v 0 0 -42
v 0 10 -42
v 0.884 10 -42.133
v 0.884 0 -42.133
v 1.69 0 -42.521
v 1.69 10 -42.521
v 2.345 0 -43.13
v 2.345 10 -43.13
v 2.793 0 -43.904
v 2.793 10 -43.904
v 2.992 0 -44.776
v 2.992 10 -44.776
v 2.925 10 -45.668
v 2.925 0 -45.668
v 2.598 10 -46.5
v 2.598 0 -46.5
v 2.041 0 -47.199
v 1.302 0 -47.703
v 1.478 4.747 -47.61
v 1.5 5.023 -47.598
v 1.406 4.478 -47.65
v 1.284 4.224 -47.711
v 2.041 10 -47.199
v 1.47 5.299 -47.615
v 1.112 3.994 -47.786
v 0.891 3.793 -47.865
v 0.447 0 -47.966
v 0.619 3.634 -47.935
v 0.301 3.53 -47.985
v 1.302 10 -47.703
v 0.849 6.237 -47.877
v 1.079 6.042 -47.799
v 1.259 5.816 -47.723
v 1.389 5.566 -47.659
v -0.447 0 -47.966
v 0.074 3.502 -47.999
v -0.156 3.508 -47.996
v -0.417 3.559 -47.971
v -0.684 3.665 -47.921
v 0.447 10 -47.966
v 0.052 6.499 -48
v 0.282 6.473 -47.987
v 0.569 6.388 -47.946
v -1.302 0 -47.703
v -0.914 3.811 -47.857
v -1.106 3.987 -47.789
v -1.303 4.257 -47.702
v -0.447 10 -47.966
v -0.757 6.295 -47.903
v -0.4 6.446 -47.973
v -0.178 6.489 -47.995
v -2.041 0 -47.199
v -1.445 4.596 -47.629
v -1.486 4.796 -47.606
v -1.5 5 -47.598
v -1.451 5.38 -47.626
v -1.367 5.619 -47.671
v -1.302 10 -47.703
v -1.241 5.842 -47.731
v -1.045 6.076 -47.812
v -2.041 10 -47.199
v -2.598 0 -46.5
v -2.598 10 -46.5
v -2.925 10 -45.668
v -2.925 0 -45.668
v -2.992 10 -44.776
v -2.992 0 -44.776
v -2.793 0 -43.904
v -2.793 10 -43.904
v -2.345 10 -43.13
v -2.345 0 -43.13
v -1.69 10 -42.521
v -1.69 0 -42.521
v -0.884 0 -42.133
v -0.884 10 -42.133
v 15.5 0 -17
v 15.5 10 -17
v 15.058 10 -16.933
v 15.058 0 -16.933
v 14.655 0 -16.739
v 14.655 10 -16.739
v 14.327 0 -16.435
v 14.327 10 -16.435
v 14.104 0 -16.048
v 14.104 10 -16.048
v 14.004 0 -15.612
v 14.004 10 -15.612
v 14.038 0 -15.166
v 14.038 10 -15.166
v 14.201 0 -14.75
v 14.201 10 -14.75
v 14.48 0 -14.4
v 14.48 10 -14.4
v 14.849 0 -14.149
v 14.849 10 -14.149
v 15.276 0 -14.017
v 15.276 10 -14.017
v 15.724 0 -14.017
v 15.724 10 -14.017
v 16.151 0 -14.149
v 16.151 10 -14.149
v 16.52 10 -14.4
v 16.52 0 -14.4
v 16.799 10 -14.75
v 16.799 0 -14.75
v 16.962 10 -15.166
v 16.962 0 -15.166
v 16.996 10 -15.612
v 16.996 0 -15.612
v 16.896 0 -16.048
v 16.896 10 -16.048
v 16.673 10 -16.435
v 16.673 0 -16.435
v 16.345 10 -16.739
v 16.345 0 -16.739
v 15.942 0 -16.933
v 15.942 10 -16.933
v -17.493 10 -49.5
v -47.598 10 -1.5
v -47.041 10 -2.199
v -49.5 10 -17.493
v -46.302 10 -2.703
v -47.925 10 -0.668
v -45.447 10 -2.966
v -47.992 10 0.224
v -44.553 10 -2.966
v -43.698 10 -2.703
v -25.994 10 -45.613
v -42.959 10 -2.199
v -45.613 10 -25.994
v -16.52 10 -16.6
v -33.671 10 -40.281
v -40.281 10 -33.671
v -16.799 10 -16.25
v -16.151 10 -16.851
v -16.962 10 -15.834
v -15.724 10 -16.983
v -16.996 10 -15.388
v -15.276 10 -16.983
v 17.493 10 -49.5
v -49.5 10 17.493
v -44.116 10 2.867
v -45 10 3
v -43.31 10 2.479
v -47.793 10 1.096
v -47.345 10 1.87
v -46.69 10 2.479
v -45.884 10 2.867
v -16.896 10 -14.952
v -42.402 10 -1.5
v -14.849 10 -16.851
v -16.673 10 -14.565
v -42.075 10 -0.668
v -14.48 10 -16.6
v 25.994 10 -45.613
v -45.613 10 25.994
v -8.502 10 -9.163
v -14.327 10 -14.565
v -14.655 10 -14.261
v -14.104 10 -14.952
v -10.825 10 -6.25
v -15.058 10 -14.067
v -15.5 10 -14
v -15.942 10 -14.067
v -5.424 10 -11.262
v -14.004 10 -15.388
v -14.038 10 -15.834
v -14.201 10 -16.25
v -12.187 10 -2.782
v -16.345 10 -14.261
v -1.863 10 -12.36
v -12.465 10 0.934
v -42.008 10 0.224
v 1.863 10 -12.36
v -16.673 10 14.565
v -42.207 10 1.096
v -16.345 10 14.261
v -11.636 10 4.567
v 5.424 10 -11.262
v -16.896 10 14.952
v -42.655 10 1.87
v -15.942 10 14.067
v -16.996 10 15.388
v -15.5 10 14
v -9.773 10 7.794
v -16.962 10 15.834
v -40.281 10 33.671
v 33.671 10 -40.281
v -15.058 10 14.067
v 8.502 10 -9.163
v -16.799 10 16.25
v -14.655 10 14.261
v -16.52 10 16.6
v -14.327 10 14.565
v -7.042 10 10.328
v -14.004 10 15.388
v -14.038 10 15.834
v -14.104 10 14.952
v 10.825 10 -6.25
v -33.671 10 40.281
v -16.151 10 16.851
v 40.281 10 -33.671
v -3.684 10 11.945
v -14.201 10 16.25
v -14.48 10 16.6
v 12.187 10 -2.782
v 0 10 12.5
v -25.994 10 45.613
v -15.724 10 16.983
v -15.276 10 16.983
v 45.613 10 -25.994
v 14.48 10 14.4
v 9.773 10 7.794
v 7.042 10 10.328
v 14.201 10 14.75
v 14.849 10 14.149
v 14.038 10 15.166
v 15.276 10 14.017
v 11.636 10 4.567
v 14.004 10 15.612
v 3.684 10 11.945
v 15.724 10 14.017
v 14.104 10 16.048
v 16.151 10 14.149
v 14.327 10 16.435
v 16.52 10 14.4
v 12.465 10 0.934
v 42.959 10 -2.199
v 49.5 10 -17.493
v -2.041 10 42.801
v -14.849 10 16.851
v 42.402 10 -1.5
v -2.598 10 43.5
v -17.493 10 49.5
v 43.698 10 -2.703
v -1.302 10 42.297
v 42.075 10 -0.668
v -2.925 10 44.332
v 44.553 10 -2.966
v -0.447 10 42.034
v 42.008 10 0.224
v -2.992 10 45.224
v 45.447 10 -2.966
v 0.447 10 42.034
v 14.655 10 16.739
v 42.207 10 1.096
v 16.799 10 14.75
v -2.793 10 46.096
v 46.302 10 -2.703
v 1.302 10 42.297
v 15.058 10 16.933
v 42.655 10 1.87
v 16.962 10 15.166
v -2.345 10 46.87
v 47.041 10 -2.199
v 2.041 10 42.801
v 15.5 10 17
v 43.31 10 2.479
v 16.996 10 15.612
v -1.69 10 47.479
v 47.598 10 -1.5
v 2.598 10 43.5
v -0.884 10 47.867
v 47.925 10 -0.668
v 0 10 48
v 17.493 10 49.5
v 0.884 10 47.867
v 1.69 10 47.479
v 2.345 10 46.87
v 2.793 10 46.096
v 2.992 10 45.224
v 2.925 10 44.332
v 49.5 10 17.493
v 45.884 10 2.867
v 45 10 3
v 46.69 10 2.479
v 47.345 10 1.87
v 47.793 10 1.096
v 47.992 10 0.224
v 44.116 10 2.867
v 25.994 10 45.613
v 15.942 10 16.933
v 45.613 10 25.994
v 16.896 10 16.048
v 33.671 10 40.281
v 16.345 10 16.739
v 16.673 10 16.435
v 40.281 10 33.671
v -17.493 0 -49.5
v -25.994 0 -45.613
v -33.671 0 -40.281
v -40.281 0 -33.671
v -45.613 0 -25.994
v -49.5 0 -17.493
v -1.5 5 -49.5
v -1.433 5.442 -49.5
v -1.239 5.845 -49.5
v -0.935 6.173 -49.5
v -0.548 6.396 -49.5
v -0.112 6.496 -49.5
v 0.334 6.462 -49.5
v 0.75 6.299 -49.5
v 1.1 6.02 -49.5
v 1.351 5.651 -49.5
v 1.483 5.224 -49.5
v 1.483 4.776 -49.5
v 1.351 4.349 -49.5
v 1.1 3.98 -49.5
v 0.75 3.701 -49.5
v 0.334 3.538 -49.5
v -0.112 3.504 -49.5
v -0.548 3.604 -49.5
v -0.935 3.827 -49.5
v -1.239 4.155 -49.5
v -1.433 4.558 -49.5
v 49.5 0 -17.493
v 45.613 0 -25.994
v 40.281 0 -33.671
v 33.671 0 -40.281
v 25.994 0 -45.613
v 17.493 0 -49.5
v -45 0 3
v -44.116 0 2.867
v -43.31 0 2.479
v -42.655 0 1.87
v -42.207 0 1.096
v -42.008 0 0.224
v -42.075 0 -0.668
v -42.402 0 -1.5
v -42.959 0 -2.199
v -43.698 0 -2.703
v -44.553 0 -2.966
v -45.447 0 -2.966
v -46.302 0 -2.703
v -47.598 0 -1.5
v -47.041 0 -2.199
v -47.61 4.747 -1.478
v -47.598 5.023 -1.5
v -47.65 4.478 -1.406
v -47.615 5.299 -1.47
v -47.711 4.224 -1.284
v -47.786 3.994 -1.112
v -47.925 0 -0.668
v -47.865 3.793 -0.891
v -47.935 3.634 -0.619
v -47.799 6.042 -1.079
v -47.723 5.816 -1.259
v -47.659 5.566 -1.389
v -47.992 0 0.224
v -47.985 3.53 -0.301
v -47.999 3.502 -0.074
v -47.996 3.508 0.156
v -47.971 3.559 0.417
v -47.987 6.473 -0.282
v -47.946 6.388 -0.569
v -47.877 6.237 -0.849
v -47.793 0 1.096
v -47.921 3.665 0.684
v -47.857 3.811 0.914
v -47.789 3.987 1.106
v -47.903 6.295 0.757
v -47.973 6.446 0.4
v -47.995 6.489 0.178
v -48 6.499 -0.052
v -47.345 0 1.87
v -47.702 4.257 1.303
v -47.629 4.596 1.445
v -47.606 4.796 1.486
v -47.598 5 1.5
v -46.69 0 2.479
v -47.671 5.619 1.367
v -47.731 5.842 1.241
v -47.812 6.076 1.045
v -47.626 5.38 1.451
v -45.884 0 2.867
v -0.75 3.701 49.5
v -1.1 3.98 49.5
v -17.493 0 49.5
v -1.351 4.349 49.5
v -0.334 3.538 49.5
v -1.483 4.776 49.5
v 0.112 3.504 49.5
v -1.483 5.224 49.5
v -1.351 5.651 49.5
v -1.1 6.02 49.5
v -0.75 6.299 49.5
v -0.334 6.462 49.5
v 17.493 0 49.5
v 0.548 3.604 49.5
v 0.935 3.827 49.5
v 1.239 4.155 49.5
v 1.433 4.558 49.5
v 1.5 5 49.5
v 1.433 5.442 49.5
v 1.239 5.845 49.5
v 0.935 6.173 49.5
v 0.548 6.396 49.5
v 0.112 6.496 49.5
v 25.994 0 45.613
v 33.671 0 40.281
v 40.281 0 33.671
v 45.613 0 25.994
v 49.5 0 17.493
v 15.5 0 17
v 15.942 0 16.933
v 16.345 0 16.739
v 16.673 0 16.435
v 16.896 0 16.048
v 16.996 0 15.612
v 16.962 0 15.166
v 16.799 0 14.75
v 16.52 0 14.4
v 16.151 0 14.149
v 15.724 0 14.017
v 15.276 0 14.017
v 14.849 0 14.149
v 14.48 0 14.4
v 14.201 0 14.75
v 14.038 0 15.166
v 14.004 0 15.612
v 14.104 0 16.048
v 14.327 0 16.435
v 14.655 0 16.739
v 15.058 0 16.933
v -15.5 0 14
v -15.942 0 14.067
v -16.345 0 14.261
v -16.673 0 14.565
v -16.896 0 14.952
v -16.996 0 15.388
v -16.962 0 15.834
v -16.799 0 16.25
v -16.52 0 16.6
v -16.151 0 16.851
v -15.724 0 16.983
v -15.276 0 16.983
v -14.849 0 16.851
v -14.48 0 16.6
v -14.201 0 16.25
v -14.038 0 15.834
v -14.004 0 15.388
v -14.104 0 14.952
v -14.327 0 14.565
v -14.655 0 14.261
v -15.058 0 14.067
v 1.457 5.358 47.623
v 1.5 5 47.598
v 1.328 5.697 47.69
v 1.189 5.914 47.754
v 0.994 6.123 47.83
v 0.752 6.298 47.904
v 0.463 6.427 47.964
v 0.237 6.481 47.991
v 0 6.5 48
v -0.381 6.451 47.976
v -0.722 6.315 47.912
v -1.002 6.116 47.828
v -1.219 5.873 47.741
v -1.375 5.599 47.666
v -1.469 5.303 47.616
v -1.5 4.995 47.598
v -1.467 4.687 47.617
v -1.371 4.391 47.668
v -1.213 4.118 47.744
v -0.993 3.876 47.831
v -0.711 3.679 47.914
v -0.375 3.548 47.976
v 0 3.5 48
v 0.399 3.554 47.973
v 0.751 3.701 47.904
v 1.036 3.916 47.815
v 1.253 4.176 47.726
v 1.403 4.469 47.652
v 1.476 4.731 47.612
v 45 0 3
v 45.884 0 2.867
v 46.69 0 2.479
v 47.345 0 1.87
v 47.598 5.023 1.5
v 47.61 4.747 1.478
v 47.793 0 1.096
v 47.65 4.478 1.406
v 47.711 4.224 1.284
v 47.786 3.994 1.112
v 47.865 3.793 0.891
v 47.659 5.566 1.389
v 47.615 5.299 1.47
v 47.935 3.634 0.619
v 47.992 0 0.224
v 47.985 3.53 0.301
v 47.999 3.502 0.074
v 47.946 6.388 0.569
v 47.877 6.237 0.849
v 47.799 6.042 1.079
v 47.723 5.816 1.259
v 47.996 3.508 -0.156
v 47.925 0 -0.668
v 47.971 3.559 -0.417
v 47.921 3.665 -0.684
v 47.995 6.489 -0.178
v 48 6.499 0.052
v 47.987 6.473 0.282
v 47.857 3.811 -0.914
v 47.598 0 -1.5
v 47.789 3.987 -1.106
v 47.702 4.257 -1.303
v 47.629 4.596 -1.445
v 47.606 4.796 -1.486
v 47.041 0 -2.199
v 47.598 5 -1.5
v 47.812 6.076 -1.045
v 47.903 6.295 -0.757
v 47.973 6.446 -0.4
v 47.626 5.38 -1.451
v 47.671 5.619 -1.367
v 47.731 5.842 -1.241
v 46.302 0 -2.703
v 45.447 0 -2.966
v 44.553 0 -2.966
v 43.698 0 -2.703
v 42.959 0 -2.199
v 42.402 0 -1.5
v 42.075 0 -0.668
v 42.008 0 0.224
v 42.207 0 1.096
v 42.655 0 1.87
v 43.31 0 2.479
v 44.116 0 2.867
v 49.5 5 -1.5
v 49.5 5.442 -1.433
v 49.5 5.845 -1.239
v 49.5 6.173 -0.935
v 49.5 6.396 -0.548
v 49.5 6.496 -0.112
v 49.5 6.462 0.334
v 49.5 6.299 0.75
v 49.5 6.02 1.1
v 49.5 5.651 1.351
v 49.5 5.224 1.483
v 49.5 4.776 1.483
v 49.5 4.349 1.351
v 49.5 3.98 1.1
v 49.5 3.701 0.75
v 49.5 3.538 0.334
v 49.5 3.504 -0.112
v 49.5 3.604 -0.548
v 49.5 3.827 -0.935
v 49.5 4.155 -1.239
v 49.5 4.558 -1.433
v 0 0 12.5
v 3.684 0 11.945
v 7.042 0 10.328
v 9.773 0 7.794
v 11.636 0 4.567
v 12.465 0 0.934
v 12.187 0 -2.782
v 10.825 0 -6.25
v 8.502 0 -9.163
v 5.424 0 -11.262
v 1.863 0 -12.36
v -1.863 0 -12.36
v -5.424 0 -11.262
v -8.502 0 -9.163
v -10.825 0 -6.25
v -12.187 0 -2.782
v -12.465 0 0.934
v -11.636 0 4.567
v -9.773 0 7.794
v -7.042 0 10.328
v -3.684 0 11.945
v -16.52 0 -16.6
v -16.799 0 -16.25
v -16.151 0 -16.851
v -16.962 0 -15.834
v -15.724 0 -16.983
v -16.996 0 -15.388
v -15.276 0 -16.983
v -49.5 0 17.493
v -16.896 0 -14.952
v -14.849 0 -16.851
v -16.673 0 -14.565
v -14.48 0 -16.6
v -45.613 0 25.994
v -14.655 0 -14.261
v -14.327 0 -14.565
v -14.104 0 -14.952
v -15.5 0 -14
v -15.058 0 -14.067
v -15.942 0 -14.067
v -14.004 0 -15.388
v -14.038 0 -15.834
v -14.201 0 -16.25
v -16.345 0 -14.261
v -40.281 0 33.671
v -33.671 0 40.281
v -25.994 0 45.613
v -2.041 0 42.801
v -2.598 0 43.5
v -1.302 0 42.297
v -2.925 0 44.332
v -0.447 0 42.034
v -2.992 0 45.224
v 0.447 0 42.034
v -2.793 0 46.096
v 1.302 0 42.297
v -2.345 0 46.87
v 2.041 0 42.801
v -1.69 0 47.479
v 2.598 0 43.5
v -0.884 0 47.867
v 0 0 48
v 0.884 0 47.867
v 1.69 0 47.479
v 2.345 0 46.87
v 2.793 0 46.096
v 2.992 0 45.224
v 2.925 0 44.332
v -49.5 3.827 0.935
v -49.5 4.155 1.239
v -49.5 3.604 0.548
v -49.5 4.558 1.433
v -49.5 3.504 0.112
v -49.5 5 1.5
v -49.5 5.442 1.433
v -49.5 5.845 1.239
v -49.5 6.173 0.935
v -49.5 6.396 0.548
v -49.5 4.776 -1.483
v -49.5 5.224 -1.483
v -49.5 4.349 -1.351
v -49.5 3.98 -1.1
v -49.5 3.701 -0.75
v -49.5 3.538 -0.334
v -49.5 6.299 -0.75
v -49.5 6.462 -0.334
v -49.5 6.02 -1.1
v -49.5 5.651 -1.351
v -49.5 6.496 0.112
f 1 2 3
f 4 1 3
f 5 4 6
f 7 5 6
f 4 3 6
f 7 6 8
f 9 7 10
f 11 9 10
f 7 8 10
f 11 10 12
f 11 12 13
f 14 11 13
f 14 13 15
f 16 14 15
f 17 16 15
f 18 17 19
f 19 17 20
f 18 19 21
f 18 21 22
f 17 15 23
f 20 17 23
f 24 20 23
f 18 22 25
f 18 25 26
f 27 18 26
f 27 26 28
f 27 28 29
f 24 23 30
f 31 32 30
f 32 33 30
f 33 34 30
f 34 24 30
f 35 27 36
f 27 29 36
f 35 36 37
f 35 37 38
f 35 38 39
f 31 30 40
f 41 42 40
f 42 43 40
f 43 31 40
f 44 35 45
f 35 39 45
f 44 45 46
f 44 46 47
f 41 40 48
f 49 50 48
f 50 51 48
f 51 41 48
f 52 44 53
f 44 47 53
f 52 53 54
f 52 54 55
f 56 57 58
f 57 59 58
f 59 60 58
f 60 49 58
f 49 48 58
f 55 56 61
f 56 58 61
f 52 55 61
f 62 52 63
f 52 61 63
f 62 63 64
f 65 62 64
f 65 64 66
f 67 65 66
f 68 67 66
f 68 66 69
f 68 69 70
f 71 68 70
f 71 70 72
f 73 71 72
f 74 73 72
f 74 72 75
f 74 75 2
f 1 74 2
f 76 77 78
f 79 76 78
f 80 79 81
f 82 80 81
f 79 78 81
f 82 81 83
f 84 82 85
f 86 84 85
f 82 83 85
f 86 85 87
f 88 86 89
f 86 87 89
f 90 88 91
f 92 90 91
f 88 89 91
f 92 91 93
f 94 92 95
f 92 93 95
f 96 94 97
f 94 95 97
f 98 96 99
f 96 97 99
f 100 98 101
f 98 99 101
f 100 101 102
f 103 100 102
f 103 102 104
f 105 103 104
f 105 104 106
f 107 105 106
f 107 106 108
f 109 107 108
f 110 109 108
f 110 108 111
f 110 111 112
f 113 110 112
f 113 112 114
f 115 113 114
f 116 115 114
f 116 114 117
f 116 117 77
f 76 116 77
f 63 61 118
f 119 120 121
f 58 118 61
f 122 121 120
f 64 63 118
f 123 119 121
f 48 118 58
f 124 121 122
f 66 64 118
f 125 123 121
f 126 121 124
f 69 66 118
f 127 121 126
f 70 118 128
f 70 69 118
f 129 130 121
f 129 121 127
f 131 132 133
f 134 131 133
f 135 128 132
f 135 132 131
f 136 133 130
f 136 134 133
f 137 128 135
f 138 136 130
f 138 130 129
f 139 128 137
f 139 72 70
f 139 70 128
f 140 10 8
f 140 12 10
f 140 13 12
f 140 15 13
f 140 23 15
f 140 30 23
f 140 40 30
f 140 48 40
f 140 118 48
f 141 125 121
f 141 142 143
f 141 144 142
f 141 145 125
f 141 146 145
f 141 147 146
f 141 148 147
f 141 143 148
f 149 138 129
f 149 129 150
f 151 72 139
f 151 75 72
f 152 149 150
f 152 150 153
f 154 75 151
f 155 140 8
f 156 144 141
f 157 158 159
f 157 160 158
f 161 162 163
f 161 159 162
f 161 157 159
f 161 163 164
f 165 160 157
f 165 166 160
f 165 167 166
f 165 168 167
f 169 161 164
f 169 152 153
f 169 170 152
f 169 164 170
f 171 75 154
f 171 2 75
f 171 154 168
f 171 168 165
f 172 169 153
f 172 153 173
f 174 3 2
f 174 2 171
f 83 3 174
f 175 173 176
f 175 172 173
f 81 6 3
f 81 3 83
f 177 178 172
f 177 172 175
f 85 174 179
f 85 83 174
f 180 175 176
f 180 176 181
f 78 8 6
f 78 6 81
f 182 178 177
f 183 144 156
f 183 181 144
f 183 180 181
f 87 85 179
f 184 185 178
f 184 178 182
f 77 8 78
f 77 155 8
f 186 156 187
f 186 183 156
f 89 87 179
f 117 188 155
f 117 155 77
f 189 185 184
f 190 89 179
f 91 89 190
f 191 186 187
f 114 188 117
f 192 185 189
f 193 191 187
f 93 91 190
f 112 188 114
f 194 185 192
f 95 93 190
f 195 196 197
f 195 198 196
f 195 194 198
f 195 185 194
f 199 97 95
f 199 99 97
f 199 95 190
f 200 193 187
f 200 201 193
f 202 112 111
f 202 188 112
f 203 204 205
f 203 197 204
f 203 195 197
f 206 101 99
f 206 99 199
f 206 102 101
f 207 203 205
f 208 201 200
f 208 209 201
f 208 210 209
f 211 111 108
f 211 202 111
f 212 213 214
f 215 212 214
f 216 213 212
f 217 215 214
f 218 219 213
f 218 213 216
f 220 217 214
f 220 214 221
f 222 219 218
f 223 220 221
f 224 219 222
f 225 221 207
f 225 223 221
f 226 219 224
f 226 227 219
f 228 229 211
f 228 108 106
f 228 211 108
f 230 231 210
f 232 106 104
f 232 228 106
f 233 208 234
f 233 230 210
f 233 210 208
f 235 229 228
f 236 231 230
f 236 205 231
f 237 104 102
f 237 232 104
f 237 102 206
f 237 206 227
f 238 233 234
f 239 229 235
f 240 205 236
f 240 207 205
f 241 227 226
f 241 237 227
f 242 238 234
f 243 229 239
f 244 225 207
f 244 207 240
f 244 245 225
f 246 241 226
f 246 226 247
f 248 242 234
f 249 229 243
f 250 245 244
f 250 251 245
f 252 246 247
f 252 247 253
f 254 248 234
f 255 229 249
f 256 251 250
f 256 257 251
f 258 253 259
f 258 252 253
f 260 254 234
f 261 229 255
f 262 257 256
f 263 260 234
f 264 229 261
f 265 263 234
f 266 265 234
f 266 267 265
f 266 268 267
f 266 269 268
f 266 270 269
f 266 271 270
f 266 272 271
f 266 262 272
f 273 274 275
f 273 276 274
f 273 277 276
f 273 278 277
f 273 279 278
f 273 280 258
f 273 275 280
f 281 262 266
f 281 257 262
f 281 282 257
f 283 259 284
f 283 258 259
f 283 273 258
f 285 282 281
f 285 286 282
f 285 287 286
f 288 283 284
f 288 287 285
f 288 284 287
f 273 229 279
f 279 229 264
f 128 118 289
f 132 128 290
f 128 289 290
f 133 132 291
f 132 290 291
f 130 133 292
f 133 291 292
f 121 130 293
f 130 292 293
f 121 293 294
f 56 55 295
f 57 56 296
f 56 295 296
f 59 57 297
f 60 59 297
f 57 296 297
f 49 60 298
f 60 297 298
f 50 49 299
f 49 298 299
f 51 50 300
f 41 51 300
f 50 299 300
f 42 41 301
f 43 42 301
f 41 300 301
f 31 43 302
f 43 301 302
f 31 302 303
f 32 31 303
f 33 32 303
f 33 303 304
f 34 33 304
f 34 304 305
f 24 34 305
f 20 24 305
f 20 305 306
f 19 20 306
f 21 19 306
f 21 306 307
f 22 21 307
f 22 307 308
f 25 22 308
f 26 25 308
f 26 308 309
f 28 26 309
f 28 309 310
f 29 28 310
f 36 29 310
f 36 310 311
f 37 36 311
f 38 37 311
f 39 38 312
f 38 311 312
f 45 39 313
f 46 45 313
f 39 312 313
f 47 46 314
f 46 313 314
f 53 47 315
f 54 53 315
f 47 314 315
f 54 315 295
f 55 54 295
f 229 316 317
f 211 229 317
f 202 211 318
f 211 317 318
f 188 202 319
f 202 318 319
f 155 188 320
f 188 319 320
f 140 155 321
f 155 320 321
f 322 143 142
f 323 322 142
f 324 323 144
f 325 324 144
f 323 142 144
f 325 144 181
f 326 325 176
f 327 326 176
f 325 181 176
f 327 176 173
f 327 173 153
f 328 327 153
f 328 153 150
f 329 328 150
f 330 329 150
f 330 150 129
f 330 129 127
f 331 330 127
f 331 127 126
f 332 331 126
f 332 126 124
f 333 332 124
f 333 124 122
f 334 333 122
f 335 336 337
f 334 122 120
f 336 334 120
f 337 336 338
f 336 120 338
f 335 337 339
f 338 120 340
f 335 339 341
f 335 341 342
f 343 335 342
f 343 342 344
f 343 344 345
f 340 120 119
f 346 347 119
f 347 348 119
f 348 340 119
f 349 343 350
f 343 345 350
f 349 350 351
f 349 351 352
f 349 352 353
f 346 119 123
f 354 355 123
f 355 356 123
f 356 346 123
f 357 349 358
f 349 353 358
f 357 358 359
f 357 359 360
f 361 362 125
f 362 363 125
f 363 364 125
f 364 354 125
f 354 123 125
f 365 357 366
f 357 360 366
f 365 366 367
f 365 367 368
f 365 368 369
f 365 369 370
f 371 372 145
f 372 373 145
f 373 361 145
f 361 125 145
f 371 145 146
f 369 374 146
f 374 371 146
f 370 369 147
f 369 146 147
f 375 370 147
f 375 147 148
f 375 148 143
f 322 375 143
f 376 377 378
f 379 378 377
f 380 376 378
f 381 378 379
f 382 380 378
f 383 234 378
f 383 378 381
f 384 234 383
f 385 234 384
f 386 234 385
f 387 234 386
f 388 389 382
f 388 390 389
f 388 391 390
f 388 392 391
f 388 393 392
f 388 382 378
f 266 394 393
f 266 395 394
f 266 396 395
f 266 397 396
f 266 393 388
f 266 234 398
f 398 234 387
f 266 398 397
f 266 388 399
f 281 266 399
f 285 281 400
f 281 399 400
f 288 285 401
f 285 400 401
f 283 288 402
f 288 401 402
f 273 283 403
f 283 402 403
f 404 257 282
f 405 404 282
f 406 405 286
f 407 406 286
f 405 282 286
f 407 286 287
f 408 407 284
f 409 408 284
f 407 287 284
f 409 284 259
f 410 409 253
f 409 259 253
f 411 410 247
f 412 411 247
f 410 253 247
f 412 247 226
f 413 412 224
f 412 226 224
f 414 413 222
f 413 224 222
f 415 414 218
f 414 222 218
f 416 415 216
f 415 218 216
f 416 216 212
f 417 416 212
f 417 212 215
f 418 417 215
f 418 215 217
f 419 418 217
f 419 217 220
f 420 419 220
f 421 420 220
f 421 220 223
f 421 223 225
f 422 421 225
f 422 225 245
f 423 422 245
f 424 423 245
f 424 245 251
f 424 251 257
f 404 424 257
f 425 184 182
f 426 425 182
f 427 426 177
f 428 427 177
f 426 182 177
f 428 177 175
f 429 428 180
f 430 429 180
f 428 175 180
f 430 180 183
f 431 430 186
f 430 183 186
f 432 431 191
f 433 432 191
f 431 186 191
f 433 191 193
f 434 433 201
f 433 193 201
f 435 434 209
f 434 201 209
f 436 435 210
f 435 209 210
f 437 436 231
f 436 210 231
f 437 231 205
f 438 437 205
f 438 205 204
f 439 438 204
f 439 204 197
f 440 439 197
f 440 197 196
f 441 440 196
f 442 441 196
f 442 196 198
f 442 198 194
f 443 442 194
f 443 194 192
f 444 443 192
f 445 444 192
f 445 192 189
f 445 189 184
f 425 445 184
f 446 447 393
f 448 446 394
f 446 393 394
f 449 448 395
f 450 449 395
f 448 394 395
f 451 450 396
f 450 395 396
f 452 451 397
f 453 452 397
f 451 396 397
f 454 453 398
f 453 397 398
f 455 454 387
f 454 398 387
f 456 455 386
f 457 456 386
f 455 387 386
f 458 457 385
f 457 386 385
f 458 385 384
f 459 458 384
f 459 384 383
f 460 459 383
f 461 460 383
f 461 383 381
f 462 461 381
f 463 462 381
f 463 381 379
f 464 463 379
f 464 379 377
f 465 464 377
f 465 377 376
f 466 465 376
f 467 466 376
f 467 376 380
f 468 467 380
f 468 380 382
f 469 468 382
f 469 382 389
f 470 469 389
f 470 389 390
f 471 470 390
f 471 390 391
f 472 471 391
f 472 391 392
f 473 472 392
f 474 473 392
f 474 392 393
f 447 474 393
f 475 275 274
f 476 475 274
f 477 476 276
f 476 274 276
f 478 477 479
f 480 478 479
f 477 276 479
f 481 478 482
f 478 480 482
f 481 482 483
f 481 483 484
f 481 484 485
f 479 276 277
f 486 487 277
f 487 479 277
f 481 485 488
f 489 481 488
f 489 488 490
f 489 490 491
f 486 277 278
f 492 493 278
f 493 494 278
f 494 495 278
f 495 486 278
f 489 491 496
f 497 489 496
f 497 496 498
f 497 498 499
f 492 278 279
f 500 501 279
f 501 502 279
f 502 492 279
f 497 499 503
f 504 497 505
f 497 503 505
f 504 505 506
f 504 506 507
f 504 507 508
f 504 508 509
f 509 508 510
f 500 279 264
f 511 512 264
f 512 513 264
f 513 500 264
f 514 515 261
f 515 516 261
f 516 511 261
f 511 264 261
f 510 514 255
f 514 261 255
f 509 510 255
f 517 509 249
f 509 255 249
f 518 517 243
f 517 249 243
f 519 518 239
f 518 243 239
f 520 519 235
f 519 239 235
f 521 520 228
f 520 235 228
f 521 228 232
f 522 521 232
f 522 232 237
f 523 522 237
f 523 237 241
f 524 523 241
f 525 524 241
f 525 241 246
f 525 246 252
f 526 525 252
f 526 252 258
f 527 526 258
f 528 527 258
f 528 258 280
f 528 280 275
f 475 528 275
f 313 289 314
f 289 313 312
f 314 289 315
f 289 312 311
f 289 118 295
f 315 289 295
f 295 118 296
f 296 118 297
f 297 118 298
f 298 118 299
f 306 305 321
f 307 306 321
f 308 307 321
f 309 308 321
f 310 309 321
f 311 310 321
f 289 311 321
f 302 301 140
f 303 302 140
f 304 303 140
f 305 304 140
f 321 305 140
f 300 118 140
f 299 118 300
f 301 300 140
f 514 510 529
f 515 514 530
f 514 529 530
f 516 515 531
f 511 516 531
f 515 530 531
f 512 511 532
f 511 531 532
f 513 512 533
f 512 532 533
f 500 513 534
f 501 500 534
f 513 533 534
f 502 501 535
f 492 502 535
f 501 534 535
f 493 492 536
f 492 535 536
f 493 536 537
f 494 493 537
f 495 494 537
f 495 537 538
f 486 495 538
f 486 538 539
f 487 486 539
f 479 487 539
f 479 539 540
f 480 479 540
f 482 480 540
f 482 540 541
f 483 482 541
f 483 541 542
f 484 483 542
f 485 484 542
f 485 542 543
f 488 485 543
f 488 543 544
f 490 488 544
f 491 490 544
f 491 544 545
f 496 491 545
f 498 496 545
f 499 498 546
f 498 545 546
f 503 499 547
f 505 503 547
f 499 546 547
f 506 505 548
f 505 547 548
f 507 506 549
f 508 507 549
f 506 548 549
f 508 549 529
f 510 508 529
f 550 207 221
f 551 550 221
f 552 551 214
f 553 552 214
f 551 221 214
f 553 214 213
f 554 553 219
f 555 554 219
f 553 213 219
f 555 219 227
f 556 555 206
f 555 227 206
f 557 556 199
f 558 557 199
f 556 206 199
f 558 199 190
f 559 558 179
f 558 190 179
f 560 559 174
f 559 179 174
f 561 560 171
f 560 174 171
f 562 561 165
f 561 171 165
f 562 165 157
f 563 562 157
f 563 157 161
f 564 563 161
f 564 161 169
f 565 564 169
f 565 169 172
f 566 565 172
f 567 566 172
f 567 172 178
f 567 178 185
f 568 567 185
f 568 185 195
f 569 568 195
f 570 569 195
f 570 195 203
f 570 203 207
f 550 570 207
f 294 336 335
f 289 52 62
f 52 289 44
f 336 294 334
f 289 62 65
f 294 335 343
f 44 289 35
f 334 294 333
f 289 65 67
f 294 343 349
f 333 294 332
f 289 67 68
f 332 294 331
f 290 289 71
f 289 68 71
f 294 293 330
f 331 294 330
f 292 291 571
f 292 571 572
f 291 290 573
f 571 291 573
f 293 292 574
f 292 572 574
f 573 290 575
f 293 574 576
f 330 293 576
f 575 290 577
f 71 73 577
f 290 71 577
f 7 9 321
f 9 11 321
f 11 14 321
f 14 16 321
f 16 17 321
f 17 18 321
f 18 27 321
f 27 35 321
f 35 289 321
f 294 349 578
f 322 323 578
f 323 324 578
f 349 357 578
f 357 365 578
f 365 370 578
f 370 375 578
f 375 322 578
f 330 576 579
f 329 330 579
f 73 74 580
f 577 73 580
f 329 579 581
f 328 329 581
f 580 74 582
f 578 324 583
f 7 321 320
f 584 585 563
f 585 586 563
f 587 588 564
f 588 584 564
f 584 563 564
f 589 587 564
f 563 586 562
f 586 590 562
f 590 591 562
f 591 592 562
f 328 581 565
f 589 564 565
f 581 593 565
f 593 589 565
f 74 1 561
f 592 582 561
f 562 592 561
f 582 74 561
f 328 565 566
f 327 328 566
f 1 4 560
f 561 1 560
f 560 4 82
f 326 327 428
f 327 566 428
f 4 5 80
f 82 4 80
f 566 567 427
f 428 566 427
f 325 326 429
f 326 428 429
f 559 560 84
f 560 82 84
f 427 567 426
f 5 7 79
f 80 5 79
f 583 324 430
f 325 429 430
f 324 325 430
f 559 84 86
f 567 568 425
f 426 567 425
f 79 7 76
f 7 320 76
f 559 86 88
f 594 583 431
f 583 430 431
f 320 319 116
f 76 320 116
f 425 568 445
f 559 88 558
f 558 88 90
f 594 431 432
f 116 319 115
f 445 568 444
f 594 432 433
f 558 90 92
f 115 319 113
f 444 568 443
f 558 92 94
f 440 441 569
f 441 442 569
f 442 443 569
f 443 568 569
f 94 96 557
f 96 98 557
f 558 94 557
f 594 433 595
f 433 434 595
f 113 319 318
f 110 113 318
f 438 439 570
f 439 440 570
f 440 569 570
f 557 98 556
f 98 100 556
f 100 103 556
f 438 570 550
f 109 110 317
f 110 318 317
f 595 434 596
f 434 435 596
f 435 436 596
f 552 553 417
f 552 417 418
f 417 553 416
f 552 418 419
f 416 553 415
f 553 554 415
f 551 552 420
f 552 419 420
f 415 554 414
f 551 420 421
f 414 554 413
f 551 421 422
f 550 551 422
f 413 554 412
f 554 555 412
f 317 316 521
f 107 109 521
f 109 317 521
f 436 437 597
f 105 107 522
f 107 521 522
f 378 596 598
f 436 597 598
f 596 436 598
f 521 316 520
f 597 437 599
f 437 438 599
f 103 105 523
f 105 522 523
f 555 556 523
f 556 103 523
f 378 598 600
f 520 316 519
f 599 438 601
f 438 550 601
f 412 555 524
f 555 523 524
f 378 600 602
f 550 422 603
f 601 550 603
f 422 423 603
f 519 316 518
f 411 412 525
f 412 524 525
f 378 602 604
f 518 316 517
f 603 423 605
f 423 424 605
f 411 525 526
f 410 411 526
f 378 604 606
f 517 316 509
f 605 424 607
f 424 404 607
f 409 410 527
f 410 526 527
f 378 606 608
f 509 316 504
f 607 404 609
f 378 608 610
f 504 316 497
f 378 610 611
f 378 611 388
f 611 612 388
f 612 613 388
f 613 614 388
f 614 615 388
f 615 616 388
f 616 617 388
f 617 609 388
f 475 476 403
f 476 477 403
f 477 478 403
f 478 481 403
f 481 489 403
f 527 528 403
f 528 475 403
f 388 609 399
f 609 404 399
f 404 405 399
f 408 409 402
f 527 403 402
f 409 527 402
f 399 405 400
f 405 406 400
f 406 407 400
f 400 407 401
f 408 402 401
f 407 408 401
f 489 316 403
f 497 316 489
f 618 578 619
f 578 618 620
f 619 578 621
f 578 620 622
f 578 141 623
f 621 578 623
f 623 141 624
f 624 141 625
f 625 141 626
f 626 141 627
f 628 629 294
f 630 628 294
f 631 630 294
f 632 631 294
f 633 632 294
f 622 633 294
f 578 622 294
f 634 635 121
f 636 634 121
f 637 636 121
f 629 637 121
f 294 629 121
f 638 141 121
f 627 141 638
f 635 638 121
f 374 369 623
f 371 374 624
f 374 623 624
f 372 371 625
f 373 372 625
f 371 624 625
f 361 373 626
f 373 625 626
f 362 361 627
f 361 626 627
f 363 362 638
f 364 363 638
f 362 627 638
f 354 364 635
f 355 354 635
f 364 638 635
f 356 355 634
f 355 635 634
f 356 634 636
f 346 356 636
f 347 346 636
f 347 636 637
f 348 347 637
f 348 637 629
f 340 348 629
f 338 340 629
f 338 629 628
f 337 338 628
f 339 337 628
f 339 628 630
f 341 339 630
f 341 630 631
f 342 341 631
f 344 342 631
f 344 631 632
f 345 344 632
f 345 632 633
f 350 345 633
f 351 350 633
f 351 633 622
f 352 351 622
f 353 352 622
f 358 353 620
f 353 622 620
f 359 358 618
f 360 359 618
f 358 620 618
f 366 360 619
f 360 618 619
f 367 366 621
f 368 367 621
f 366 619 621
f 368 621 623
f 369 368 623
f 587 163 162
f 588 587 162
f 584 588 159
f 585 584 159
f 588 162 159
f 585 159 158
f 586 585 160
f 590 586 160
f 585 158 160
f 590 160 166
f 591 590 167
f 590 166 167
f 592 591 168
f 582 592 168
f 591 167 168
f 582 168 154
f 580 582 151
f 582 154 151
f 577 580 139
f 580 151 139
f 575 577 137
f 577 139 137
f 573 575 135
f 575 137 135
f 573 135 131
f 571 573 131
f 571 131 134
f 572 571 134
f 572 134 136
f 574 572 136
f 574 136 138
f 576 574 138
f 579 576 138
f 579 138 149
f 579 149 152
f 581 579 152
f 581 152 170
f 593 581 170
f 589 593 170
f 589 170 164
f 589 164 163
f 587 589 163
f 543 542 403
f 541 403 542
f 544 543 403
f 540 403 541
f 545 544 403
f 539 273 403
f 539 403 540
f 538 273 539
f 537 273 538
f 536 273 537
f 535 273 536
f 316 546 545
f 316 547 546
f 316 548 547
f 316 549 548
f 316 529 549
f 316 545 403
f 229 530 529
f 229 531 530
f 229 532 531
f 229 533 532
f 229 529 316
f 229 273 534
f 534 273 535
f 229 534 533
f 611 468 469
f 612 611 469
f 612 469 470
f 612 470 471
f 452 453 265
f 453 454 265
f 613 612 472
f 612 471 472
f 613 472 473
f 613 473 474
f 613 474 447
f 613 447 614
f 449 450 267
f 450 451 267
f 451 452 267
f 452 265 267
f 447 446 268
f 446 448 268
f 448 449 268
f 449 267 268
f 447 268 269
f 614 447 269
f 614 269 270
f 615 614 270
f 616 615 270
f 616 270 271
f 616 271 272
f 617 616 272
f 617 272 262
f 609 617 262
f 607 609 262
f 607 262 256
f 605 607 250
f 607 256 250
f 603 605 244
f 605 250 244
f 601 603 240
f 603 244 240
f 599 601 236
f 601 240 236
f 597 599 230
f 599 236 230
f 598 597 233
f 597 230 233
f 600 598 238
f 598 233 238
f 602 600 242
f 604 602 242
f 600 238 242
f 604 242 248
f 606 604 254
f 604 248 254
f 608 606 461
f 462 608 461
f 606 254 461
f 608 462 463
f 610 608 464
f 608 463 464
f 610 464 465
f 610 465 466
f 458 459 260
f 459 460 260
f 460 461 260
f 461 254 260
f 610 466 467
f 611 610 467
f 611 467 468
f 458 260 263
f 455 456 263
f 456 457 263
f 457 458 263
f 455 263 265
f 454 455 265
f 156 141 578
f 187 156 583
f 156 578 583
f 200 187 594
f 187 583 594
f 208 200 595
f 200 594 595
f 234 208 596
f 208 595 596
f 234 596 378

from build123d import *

# Parameters (mm, degrees)
SKETCH1_R               = 52.5
BOSS_EXTRUDE1_DEPTH     = 10
SKETCH3_R               = 3
CUT_EXTRUDE1_DEPTH      = 75.916620319
SKETCH4_W               = 34.98571137
SKETCH4_H               = 10
SKETCH4_W_2             = 10
SKETCH4_H_2             = 34.98571137
CUT_EXTRUDE_THIN1_DEPTH = 75.916620319
CUT_EXTRUDE3_REACH      = 113.136
CUT_EXTRUDE3_END_RADIUS = 3
SKETCH5_R               = 1.5
CIRPATTERN1_COUNT       = 4
SKETCH6_R               = 12.5
CUT_EXTRUDE4_DEPTH      = 71.714213718
SKETCH7_R               = 1.5
CUT_EXTRUDE5_DEPTH      = 71.714213718


with BuildPart() as part:
    # Sketch1 → Boss-Extrude1 (new body)
    with BuildSketch(Plane(origin=(0, 0, 0), x_dir=(1, 0, 0), z_dir=(0, 1, 0))):
        with Locations(Location((0, 0, 0), (0, 0, 270))):
            Circle(SKETCH1_R)
    extrude(amount=BOSS_EXTRUDE1_DEPTH)

    # Sketch3 → Cut-Extrude1 (cut, through all)
    with BuildSketch(Plane(origin=(0, 10, 0), x_dir=(1, 0, 0), z_dir=(0, 1, 0))):
        with Locations(Location((0, 45, 0), (0, 0, 270))):
            Circle(SKETCH3_R)
        with Locations(Location((45, 0, 0), (0, 0, 270))):
            Circle(SKETCH3_R)
        with Locations(Location((0, -45, 0), (0, 0, 270))):
            Circle(SKETCH3_R)
        with Locations(Location((-45, 0, 0), (0, 0, 270))):
            Circle(SKETCH3_R)
    extrude(amount=-CUT_EXTRUDE1_DEPTH, mode=Mode.SUBTRACT)

    # Sketch4 → Cut-Extrude-Thin1 (cut, through all)
    with BuildSketch(Plane(origin=(0, 10, 0), x_dir=(1, 0, 0), z_dir=(0, 1, 0))):
        with Locations((0, -54.5)):
            Rectangle(SKETCH4_W, SKETCH4_H)
        with Locations((54.5, 0)):
            Rectangle(SKETCH4_W_2, SKETCH4_H_2)
        with Locations((0, 54.5)):
            Rectangle(SKETCH4_W, SKETCH4_H)
        with Locations((-54.5, 0)):
            Rectangle(SKETCH4_W_2, SKETCH4_H_2)
    extrude(amount=-CUT_EXTRUDE_THIN1_DEPTH, mode=Mode.SUBTRACT)

    # Cut-Extrude3: up to this cylinder (the profile starts outside it)
    cut_extrude3_end = Plane(origin=(0, 5, 45), z_dir=(0, 1, 0)) * Cylinder(CUT_EXTRUDE3_END_RADIUS, 233.272, mode=Mode.PRIVATE)
    # Sketch5 → Cut-Extrude3 (cut, up to the surface)
    with BuildSketch(Plane.XY.offset(49.5), mode=Mode.PRIVATE) as cut_extrude3_sk1:
        with Locations((0, 5)):
            Circle(SKETCH5_R)
    cut_extrude3_tool1 = extrude(cut_extrude3_sk1.sketch, amount=-CUT_EXTRUDE3_REACH, mode=Mode.PRIVATE) - cut_extrude3_end
    cut_extrude3 = cut_extrude3_tool1.solids().sort_by_distance((0, 5, 49.5))[0]
    add(cut_extrude3, mode=Mode.SUBTRACT)

    # CirPattern1: Cut-Extrude3 ×4 about axis
    cirpattern1_axis = Axis((0, 10, 0), (0, -1, 0))
    for i in range(1, CIRPATTERN1_COUNT):
        add(cut_extrude3.rotate(cirpattern1_axis, i * 360 / CIRPATTERN1_COUNT), mode=Mode.SUBTRACT)

    # Sketch6 → Cut-Extrude4 (cut, through all)
    with BuildSketch(Plane(origin=(0, 10, 0), x_dir=(1, 0, 0), z_dir=(0, 1, 0))):
        with Locations(Location((0, 0, 0), (0, 0, 270))):
            Circle(SKETCH6_R)
    extrude(amount=-CUT_EXTRUDE4_DEPTH, mode=Mode.SUBTRACT)

    # Sketch7 → Cut-Extrude5 (cut, through all)
    with BuildSketch(Plane(origin=(0, 10, 0), x_dir=(1, 0, 0), z_dir=(0, 1, 0))):
        with Locations(Location((-15.5, 15.5, 0), (0, 0, 270))):
            Circle(SKETCH7_R)
        with Locations(Location((15.5, 15.5, 0), (0, 0, 90))):
            Circle(SKETCH7_R)
        with Locations(Location((15.5, -15.5, 0), (0, 0, 270))):
            Circle(SKETCH7_R)
        with Locations(Location((-15.5, -15.5, 0), (0, 0, 90))):
            Circle(SKETCH7_R)
    extrude(amount=-CUT_EXTRUDE5_DEPTH, mode=Mode.SUBTRACT)


solid = part.part
